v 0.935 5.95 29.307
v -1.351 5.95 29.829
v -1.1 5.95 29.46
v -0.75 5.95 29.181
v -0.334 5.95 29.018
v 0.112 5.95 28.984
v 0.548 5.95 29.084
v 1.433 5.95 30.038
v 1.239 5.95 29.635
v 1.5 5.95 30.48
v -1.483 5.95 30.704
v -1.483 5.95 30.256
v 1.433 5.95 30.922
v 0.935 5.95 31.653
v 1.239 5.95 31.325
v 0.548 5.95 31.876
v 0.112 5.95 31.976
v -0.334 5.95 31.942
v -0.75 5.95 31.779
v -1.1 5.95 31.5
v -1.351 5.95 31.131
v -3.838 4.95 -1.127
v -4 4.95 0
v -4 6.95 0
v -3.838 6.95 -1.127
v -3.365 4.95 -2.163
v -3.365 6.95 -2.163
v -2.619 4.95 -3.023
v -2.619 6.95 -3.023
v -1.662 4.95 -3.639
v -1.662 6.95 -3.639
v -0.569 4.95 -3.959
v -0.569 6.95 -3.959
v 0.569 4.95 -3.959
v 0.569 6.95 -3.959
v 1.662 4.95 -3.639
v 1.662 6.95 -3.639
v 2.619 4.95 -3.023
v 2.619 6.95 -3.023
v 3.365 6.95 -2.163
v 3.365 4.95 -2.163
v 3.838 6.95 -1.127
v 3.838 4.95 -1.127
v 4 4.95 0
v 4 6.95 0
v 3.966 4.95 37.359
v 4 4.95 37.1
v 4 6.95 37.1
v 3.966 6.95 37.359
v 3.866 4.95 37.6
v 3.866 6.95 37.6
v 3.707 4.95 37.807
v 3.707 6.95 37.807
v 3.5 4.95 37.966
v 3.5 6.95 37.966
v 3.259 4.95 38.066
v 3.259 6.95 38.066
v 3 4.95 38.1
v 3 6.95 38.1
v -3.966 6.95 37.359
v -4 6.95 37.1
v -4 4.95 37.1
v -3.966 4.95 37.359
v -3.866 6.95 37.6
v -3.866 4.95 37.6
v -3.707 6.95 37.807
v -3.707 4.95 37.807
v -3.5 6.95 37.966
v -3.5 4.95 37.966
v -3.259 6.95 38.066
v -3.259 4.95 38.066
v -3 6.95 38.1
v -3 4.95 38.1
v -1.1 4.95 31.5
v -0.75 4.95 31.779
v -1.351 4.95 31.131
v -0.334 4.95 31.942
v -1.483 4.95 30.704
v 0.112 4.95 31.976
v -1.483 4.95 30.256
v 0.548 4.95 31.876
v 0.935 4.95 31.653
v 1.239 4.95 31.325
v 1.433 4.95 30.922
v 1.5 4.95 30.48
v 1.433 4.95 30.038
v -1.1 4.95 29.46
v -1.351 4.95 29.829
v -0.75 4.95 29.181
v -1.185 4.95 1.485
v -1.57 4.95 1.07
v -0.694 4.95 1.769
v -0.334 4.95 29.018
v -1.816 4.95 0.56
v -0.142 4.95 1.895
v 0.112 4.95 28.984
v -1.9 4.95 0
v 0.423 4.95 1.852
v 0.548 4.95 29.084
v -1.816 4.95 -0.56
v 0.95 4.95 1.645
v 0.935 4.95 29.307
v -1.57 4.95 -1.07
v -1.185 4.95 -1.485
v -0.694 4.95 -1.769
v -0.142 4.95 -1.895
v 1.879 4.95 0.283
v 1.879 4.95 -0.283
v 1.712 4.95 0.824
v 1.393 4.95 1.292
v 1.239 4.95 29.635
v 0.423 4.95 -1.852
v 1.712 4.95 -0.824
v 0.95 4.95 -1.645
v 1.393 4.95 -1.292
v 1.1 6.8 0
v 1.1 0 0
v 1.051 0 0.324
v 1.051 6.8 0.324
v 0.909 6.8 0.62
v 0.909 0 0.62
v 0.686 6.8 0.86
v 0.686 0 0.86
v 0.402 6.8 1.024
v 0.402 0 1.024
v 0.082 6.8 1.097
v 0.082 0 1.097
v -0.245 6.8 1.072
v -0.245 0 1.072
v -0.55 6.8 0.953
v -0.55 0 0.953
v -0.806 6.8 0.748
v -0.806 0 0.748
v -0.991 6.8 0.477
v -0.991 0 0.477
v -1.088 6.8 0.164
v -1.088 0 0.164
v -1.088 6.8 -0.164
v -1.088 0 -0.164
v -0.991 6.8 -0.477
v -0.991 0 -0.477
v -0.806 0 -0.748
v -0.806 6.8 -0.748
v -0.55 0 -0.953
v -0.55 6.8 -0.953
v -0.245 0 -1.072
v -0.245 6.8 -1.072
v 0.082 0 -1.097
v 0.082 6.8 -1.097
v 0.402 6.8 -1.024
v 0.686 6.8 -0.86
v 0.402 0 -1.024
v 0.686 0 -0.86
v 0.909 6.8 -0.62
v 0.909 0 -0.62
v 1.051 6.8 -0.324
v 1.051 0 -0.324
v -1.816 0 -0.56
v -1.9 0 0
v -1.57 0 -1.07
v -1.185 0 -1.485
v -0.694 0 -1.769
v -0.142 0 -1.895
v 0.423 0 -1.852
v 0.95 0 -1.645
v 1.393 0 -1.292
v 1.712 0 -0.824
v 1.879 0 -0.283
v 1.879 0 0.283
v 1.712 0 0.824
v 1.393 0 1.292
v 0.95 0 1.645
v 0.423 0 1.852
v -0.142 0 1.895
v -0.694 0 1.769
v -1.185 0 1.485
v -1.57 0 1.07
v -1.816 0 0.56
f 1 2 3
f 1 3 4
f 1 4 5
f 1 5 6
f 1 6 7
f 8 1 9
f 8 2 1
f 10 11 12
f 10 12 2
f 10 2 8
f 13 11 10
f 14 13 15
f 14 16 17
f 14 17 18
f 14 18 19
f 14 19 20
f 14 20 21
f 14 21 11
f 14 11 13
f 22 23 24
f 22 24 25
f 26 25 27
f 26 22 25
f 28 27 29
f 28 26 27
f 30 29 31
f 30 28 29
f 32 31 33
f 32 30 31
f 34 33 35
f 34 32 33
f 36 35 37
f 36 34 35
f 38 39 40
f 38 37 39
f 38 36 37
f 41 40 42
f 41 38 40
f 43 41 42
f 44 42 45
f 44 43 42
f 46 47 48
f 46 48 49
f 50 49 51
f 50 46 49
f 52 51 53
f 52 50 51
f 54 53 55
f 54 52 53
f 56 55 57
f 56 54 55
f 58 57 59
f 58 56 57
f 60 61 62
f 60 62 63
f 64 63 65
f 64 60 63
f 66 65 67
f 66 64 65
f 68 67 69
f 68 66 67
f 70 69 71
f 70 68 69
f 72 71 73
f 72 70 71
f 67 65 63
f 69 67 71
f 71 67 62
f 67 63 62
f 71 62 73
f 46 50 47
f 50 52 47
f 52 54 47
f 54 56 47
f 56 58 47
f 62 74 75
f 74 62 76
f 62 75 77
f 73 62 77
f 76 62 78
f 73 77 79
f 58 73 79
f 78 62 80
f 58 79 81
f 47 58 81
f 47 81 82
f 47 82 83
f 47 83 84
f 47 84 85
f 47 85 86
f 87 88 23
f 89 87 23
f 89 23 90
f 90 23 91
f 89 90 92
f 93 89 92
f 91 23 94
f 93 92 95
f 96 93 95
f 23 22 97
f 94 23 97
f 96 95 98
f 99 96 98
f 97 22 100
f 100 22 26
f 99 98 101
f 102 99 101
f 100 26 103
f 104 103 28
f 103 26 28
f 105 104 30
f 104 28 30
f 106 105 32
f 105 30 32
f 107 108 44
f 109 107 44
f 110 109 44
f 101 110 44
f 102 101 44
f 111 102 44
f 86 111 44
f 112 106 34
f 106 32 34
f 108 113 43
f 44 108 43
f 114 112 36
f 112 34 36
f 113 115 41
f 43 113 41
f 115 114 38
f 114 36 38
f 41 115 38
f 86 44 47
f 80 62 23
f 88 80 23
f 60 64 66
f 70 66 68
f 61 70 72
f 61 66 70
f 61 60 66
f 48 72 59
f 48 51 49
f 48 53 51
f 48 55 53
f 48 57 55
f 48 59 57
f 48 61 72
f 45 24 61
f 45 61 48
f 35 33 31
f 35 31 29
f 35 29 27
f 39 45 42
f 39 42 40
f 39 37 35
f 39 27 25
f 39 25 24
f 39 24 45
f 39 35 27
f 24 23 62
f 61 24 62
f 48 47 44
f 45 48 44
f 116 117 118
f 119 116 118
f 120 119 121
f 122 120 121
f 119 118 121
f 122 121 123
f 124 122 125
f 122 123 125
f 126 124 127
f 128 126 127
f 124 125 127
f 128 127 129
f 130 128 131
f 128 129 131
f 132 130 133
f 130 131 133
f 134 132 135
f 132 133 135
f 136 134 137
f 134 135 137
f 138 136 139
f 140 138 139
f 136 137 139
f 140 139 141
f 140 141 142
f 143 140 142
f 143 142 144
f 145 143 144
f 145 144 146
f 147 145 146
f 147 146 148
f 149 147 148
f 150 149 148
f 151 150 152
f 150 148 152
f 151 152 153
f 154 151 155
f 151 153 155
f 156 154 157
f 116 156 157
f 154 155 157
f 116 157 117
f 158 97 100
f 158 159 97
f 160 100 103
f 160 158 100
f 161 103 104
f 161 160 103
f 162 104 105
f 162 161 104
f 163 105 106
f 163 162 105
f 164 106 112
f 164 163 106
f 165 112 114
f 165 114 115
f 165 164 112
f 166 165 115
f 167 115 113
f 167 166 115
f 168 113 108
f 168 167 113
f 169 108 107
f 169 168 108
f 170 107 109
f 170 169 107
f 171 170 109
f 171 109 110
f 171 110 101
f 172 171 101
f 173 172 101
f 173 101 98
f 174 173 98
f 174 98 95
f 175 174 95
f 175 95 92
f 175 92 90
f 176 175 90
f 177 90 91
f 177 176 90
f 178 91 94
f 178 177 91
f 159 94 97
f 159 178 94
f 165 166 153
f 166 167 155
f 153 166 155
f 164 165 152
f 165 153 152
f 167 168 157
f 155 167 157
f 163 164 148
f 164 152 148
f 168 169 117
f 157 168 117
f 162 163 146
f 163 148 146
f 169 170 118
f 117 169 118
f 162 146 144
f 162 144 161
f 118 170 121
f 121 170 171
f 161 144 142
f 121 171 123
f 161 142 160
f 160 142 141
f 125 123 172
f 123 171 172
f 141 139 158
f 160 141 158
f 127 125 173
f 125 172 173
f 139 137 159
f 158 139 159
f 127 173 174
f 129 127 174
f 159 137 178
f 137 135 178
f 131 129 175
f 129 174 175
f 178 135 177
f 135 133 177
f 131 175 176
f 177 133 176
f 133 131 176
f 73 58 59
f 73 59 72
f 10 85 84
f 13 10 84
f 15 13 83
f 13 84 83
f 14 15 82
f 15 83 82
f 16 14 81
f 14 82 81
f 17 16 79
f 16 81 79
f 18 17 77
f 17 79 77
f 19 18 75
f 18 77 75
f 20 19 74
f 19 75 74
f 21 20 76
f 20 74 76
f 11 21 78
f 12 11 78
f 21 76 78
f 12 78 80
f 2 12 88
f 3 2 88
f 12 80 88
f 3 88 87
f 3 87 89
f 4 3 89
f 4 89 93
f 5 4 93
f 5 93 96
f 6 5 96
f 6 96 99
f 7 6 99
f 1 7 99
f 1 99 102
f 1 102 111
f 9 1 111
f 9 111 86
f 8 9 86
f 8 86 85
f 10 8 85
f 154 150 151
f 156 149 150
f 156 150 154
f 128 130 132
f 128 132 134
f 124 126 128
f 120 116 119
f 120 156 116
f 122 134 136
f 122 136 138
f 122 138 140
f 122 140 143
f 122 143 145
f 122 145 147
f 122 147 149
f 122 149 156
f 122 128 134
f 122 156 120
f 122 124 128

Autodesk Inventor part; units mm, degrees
ref_plane "YZ Plane" through (0, 0, 0) normal (1, 0, 0) x (0, 1, 0)
ref_plane "XZ Plane" through (0, 0, 0) normal (0, 1, 0) x (-1, 0, 0)
ref_plane "XY Plane" through (0, 0, 0) normal (0, 0, 1) x (1, 0, 0)
sketch "Sketch1" plane through (0, 0, 0) normal (0, 1, 0) x (-1, 0, 0)
  circle A0 centre (0, 0) radius 1.9
  dimension "d0" = 3.8
extrude "Extrusion1" add sketch "Sketch1" along normal blind 6.2
sketch "Sketch2" plane through (0, 6.2, 0) normal (0, 1, 0) x (1, 0, 0)
  line L0 (0, 0) -> (0, -38.1) construction
  line L1 (-4, 0) -> (-4, -38.1)
  line L2 (4, -38.1) -> (4, 0)
  arc A0 (4, 0) -> (-4, 0) centre (0, 0) ccw
  line L3 (4, -38.1) -> (-4, -38.1)
  point P0 (0, -19.05)
  dimension "d6" = 4
  dimension "d7" = 38.1
extrude "Extrusion2" add sketch "Sketch2" along normal blind 0.75 and the other way blind 1.25
sketch "Sketch3" plane through (0, 4.95, 0) normal (0, -1, 0) x (1, 0, 0)
  circle A0 centre (0, 30.48) radius 1.5
  circle A1 centre (0, 0) radius 1.9 projected
  dimension "d11" = 3
  dimension "d12" = 30.48
extrude "Extrusion3" cut sketch "Sketch3" against normal blind 1 contours A0
fillet "Fillet1" radius 1 2 edges at (-4, 5.95, 38.1) (4, 5.95, 38.1)
sketch "Sketch4" plane through (0, 0, 0) normal (0, -1, 0) x (1, 0, 0)
  circle A0 centre (0, 0) radius 1.1
  dimension "d18" = 2.2
extrude "Extrusion4" cut sketch "Sketch4" against normal blind 6.8
properties part number "CC-topHand" material "ABS Plastic"
